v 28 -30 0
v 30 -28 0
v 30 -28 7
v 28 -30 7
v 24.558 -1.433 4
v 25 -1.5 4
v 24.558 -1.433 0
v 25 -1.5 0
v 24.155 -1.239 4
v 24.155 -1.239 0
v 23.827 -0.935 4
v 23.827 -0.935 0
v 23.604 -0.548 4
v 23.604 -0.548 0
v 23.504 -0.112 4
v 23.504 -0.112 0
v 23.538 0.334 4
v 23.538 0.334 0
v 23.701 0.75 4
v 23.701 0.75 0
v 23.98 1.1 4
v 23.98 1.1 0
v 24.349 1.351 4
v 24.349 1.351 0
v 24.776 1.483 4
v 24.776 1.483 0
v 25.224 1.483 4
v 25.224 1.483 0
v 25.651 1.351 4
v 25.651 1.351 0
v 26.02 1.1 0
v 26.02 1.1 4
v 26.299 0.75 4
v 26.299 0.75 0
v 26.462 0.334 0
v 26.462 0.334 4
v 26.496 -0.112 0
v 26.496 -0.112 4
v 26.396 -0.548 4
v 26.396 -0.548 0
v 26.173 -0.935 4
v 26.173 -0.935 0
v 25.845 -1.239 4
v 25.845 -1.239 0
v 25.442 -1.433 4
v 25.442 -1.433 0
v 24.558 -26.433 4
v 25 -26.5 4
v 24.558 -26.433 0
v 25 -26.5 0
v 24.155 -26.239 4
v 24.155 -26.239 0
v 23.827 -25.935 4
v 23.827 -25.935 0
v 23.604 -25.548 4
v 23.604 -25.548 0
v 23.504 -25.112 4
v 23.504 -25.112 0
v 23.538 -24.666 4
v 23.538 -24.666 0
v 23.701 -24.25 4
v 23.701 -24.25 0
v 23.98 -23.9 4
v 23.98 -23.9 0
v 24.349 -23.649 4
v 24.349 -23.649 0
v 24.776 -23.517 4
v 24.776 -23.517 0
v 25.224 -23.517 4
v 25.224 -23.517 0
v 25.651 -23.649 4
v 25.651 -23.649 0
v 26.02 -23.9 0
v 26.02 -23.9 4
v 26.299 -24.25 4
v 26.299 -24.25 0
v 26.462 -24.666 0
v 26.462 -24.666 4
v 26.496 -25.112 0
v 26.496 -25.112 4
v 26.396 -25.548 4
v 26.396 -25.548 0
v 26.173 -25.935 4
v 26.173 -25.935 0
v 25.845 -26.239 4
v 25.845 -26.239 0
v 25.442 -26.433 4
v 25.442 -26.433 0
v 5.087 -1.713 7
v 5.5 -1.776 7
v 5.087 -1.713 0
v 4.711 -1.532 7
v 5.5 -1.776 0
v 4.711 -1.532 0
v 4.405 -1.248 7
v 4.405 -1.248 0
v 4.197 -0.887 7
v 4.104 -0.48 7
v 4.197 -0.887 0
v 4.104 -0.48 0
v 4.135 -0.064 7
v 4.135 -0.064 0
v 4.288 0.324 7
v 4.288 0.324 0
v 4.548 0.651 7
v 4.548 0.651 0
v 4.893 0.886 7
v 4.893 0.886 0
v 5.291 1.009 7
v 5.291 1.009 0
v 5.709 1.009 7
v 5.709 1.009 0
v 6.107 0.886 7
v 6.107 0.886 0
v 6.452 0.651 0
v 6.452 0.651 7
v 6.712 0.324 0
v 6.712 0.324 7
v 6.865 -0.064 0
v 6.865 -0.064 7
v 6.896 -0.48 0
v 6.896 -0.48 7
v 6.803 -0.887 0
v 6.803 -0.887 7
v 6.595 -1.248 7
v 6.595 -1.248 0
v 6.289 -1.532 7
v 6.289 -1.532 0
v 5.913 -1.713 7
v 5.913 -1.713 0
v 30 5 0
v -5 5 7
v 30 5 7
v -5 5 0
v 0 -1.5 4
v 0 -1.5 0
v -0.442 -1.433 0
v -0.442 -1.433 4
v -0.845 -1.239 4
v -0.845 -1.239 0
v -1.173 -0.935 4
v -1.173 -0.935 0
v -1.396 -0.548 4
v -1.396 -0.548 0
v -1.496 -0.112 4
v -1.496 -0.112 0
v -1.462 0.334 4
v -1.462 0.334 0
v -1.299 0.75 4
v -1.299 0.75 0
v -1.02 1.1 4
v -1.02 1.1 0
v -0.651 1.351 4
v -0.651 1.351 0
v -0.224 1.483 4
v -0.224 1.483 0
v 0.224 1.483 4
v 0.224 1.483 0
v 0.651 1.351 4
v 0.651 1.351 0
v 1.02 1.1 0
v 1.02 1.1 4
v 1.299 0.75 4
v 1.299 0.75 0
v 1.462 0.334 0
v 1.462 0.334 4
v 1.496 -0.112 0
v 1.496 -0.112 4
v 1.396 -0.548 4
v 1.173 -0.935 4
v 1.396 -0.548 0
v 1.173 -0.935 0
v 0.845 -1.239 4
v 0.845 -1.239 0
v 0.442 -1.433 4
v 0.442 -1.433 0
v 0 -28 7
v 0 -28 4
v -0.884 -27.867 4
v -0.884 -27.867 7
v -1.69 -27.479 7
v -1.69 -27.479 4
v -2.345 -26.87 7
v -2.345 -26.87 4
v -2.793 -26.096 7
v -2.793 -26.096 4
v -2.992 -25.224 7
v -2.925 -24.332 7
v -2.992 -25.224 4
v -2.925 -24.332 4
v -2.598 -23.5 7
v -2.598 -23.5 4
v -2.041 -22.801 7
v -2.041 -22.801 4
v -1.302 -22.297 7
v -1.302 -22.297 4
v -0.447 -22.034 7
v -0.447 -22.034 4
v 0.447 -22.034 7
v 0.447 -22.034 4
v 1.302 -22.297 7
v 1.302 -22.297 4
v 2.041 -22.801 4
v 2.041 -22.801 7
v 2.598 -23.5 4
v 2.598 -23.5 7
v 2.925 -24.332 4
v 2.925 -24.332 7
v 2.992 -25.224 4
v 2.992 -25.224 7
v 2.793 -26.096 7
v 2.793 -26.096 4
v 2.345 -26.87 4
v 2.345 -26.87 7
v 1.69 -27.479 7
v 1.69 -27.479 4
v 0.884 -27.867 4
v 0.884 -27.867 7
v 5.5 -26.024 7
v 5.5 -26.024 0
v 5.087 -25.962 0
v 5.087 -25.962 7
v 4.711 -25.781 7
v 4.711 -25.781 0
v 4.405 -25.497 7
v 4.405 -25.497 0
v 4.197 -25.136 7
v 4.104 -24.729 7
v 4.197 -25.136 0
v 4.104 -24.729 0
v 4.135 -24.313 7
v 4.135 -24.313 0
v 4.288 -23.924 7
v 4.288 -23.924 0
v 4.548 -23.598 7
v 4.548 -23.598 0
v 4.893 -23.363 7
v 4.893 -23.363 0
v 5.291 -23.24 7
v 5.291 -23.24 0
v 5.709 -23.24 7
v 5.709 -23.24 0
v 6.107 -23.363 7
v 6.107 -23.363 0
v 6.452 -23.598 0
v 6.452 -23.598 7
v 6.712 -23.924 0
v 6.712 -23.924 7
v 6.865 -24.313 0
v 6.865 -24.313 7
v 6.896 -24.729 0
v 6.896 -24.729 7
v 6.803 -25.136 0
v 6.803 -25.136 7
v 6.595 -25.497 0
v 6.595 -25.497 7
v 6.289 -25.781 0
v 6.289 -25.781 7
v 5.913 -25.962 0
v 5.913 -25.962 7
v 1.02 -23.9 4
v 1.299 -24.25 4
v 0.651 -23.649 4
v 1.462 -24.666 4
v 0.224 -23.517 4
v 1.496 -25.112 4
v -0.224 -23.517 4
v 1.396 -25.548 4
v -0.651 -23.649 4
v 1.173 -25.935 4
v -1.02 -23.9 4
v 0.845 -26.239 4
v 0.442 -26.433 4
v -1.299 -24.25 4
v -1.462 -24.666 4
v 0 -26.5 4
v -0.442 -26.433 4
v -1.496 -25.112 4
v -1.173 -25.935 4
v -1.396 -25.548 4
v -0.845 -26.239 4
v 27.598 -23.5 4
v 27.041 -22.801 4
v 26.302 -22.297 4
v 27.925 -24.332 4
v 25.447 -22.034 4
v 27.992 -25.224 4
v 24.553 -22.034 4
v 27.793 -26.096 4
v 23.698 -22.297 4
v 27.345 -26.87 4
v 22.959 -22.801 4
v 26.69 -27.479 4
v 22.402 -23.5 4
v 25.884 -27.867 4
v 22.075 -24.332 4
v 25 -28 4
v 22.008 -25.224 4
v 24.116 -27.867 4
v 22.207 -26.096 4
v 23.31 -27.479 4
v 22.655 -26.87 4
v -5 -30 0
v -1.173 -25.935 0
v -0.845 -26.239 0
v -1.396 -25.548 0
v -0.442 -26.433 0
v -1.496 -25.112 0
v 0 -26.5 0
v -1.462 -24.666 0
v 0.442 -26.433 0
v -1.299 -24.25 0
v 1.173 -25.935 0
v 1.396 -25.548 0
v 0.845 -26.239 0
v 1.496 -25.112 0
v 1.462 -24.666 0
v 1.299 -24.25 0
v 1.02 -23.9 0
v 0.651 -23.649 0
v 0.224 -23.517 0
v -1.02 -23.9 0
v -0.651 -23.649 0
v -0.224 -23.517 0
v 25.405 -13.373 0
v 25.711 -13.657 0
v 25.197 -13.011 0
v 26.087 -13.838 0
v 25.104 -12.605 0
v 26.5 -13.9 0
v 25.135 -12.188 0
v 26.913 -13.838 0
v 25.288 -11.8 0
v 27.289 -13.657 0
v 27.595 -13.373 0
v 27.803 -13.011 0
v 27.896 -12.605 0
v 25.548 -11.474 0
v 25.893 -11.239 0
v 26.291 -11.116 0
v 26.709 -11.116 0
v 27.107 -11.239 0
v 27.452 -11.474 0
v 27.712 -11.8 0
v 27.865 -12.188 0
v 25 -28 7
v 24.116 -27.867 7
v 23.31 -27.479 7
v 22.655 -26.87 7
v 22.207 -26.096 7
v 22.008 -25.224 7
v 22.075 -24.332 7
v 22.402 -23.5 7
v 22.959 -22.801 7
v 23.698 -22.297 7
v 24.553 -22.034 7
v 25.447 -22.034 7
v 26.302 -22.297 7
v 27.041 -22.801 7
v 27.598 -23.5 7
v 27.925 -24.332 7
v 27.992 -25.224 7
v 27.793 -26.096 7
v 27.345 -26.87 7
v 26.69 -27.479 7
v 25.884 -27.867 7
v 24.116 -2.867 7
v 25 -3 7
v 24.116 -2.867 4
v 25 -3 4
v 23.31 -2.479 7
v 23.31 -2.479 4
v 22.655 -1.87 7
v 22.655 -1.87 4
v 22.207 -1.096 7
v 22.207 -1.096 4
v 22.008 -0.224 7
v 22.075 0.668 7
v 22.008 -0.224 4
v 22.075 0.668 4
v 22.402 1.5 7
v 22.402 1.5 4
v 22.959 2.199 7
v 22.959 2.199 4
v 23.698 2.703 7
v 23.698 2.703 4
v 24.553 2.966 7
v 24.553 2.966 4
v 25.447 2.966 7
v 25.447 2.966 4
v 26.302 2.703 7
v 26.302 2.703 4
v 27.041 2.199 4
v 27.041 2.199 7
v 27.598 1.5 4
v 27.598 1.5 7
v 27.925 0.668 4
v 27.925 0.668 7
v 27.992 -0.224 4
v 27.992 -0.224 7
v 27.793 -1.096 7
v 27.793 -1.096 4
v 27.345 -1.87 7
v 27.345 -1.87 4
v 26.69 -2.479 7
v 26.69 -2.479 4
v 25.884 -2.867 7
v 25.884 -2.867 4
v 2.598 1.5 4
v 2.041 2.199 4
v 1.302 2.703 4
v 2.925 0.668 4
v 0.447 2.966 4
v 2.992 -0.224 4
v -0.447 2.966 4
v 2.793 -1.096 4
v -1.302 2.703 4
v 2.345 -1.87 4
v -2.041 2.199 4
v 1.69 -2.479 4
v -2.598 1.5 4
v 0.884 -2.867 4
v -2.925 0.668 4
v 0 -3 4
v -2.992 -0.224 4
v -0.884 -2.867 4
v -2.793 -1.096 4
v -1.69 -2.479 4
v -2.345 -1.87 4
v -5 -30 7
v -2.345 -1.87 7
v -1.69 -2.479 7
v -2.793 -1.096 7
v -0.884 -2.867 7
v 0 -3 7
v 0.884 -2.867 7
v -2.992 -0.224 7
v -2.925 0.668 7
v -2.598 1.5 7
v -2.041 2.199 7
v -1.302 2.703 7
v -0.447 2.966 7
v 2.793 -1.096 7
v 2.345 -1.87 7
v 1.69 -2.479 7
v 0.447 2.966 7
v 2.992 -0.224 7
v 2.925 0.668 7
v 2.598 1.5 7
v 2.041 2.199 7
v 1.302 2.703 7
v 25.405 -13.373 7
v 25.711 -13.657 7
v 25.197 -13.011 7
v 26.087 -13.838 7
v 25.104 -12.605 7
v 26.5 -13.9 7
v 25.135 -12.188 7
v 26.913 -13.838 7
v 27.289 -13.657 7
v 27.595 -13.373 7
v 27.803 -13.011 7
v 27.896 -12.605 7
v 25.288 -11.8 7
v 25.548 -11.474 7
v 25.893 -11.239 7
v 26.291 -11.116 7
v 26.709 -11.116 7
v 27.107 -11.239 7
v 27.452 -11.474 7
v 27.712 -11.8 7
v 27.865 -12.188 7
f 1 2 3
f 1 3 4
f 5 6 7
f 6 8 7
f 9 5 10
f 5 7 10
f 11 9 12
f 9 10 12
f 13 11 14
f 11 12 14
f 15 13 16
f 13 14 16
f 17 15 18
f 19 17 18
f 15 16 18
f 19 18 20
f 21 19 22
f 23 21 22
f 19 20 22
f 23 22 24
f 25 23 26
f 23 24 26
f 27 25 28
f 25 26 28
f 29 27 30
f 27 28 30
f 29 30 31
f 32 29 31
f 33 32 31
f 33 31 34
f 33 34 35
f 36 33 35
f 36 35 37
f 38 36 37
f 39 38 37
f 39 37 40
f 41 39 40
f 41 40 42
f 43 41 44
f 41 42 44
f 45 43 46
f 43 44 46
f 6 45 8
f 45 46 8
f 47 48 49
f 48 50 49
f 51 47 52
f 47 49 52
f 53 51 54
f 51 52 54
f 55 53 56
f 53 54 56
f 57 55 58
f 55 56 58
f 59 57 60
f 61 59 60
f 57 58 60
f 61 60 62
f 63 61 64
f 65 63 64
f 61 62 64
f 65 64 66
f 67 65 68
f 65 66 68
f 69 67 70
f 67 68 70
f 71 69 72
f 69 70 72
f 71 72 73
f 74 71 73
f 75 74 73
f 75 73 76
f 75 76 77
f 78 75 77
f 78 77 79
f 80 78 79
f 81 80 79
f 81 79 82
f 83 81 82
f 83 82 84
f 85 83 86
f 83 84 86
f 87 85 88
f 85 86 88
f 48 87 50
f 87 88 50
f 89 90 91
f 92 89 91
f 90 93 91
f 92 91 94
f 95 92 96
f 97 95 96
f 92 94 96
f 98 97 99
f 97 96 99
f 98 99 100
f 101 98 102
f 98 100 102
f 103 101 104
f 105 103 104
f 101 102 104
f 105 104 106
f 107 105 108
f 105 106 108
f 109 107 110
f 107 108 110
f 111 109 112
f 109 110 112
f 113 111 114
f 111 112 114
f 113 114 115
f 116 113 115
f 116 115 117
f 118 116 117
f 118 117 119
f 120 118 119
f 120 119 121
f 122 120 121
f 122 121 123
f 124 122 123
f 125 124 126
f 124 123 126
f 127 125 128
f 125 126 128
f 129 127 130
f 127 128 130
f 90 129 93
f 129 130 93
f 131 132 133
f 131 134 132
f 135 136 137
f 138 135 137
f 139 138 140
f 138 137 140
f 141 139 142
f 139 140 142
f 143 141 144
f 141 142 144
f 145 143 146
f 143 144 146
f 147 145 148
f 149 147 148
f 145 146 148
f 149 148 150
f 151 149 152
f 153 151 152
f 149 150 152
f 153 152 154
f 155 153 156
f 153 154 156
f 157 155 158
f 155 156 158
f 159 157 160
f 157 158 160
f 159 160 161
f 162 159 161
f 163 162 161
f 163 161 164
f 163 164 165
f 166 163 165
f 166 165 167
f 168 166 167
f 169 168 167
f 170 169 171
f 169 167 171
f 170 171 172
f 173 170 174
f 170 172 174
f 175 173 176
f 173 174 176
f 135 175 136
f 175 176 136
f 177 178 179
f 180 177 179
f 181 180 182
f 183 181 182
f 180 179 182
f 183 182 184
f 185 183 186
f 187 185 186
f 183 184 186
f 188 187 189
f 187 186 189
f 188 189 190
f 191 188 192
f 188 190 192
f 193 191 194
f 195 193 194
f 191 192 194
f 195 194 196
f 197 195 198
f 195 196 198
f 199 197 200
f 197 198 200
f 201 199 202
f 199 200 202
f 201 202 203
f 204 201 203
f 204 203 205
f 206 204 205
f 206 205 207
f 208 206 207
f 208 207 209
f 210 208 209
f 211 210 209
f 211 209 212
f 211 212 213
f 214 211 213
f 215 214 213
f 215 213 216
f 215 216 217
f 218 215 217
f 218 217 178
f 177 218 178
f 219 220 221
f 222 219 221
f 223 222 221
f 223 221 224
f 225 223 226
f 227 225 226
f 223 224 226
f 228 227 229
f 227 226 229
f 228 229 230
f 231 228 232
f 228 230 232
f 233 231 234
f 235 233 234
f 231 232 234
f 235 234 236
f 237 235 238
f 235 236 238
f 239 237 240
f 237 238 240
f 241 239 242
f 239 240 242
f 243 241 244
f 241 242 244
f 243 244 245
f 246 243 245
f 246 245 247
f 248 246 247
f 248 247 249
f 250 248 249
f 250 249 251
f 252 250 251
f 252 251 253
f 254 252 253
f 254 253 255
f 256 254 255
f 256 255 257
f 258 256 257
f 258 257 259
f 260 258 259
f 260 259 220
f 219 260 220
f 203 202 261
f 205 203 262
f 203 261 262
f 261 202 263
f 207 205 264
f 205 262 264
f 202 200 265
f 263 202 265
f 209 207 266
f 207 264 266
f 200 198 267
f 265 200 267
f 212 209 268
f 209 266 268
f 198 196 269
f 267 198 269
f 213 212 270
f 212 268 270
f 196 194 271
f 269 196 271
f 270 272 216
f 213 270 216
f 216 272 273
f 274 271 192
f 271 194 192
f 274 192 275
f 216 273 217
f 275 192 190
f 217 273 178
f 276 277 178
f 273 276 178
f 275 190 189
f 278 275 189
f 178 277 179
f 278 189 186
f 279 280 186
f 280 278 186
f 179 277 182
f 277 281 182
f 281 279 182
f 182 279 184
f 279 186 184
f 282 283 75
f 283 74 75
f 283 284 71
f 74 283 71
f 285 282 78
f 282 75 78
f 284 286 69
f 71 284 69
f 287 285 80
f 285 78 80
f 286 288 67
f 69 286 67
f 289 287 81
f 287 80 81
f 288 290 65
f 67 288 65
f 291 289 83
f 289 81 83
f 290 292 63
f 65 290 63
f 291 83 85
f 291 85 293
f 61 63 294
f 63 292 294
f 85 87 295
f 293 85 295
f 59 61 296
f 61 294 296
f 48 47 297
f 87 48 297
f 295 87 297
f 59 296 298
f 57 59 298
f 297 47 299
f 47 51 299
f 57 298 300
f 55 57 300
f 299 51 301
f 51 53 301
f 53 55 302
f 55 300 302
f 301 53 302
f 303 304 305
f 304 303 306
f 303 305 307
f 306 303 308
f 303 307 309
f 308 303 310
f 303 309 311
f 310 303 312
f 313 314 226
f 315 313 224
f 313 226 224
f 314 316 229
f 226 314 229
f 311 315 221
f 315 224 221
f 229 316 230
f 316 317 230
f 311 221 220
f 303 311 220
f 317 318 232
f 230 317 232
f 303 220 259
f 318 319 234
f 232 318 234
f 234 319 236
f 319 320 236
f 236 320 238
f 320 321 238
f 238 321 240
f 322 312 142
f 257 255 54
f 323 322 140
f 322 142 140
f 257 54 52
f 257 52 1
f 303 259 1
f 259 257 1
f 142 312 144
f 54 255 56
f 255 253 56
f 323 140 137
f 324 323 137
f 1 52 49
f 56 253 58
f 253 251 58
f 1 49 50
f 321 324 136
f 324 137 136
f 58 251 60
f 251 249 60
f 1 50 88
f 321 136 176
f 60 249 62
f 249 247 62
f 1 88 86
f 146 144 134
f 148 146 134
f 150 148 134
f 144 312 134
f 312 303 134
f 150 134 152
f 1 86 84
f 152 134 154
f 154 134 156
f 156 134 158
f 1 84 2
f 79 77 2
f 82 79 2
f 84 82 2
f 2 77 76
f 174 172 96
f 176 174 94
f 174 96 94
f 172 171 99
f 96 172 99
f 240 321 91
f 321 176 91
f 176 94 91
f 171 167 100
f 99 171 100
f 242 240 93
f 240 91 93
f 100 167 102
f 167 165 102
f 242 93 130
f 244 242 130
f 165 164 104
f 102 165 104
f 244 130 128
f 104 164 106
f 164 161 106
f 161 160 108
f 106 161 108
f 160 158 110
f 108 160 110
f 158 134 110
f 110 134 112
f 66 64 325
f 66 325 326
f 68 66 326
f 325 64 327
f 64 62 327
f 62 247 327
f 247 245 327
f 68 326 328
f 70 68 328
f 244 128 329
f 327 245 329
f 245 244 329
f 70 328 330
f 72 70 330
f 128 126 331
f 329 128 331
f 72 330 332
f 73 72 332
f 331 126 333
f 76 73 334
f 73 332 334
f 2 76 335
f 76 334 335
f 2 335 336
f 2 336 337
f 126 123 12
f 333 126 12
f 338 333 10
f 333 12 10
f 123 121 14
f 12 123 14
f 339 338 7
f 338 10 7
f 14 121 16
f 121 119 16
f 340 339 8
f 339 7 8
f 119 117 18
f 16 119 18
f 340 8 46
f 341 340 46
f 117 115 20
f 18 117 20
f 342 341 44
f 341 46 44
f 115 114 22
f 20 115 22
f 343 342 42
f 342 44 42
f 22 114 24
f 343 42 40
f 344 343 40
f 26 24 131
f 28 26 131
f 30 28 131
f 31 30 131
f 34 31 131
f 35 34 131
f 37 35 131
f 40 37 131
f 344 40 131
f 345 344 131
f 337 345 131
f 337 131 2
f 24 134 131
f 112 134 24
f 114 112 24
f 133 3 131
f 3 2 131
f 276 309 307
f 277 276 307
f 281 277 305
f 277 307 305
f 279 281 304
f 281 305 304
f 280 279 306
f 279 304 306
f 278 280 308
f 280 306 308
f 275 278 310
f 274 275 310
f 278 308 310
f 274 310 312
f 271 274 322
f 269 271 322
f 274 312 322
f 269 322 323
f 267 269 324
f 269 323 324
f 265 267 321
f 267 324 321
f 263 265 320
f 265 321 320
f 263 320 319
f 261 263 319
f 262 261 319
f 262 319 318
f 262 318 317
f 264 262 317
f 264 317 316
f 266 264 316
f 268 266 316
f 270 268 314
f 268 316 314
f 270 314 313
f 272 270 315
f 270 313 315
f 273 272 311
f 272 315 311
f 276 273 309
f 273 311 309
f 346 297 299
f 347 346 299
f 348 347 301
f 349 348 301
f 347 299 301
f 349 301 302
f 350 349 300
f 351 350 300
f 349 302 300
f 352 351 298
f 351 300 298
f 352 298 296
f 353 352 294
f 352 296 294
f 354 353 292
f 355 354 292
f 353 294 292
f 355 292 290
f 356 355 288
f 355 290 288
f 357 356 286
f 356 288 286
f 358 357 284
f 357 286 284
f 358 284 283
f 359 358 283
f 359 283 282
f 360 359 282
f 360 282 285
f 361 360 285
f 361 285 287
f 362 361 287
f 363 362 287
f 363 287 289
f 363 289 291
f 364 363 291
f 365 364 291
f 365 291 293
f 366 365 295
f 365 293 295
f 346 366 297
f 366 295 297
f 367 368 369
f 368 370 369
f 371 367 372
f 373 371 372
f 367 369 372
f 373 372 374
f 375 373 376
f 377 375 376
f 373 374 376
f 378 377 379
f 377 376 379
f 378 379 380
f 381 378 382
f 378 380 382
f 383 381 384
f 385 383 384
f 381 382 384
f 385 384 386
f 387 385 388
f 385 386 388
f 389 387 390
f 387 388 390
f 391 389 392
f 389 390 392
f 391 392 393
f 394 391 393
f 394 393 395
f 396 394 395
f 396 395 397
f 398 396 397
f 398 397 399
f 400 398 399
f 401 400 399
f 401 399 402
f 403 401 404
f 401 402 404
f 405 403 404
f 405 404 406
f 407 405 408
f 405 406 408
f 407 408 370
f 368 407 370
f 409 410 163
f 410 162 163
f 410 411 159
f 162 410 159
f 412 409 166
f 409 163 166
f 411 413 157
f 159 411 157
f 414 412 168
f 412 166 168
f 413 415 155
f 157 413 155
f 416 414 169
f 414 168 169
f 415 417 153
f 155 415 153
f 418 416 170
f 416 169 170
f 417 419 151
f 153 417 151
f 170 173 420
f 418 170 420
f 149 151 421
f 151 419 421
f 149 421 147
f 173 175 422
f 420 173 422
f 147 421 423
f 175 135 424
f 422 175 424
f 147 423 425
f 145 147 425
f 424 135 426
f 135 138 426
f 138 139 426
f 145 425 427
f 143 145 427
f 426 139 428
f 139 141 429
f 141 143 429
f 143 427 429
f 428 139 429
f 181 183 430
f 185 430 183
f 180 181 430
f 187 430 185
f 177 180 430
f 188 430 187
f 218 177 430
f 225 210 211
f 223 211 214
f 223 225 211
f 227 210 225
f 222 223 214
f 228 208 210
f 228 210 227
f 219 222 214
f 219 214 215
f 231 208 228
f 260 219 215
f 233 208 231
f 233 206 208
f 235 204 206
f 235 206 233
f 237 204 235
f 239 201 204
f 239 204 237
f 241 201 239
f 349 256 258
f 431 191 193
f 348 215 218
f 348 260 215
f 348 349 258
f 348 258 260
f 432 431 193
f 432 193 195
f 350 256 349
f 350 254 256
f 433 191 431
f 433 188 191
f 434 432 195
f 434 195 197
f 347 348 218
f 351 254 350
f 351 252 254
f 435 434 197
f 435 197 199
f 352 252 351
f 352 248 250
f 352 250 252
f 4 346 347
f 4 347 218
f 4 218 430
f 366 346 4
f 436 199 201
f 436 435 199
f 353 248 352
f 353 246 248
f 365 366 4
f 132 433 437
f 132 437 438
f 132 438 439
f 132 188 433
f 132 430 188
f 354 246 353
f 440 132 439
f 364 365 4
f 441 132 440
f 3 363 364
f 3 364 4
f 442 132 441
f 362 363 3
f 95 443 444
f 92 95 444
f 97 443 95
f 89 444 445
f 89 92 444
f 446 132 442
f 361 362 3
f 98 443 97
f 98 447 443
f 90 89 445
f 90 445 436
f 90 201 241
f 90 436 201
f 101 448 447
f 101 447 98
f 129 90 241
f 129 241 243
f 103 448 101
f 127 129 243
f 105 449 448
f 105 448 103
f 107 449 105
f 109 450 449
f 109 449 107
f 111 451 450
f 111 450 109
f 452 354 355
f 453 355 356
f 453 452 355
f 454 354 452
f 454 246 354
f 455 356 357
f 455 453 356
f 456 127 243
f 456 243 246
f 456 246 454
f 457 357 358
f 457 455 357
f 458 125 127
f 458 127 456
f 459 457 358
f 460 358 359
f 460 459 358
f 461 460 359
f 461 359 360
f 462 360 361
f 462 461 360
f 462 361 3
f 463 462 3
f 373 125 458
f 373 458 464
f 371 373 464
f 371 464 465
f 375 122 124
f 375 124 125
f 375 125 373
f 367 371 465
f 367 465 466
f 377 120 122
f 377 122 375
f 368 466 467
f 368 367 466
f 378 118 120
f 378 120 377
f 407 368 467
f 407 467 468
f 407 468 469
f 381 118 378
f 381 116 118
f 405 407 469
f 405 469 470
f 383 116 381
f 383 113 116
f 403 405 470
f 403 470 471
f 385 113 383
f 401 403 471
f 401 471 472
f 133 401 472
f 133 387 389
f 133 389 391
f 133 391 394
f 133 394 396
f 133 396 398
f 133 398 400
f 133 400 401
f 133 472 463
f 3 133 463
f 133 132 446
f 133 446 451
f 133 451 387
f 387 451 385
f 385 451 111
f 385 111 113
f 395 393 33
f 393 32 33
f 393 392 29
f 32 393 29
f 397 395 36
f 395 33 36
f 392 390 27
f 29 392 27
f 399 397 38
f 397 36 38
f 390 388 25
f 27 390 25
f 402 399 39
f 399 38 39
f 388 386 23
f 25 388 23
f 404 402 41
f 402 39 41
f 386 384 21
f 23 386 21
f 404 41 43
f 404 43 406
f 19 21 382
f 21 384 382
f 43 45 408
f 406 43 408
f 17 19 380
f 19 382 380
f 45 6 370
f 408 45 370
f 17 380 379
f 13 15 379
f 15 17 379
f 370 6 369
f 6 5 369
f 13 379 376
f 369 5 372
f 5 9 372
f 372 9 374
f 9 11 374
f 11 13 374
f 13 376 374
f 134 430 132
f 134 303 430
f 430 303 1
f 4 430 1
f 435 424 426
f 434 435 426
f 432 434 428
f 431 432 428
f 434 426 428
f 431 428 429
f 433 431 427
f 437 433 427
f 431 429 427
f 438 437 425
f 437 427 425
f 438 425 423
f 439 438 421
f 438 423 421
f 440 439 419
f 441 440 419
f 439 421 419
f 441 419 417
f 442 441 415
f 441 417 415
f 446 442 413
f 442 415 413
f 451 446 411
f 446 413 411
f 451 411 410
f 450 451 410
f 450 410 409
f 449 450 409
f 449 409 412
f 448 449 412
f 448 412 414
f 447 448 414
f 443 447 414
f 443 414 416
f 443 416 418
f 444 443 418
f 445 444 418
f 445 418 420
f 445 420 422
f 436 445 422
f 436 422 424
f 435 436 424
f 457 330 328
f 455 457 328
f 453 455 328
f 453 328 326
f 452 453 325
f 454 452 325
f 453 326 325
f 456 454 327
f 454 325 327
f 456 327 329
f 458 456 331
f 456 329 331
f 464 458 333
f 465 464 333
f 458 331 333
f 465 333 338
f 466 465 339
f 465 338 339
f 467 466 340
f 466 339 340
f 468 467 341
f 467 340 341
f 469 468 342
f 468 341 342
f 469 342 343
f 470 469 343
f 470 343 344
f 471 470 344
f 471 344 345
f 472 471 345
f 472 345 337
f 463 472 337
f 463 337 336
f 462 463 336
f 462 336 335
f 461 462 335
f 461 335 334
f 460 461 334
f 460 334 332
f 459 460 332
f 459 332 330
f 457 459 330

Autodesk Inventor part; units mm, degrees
ref_plane "YZ Plane" through (0, 0, 0) normal (1, 0, 0) x (0, 1, 0)
ref_plane "XZ Plane" through (0, 0, 0) normal (0, 1, 0) x (-1, 0, 0)
ref_plane "XY Plane" through (0, 0, 0) normal (0, 0, 1) x (1, 0, 0)
ref_plane "Work Plane1" through (0, 0, 0) normal (0, 0, 1) x (1, 0, 0)
sketch "Sketch1" plane through (0, 0, 0) normal (0, 0, 1) x (1, 0, 0)
  circle A0 centre (25, -10) radius 1.45 projected
  circle A1 centre (-25, -10) radius 1.45 projected
  circle A2 centre (-25, 10) radius 1.45 projected
  circle A3 centre (25, 10) radius 1.45 projected
  circle A4 centre (-10, -25) radius 1.45 projected
  circle A5 centre (-10, 25) radius 1.45 projected
  circle A6 centre (10, 25) radius 1.45 projected
  circle A7 centre (10, -25) radius 1.45 projected
  circle A8 centre (-25, 25) radius 2.325 projected
  circle A9 centre (25, -25) radius 2.325 projected
  circle A10 centre (-25, -25) radius 2.325 projected
  circle A11 centre (25, 25) radius 2.325 projected
  line L0 (28, 30) -> (30, 28) projected
  line L1 (28, 30) -> (-28, 30) projected
  line L2 (-30, 28) -> (-28, 30) projected
  line L3 (-30, 28) -> (-30, -28) projected
  line L4 (-28, -30) -> (-30, -28) projected
  line L5 (-28, -30) -> (28, -30) projected
  line L6 (30, -28) -> (28, -30) projected
  line L7 (30, -28) -> (30, 28) projected
  circle A12 centre (-17.5, -17.5) radius 1.95 projected
  circle A13 centre (17.5, 17.5) radius 1.95 projected
  circle A14 centre (17.5, -17.5) radius 1.95 projected
  circle A15 centre (-17.5, 17.5) radius 1.95 projected
  circle A16 centre (0, 0) radius 7.5 projected
  line L8 (30, -30) -> (-5, -30)
  line L9 (-5, -30) -> (-5, 5)
  line L10 (-5, 5) -> (30, 5)
  line L11 (30, 5) -> (30, -30)
  point P0 (0, 0)
  dimension "d0" = 35
  dimension "d1" = 35
extrude "Extrusion1" add sketch "Sketch1" along normal blind 7 contours A0 | A7 | A9 | L7 L6 L5 L9 A16 L10 | A16 L9 L10 | A14 picked at (1.7753, -1.9143)
sketch "Sketch2" plane through (0, 0, 7) normal (0, 0, 1) x (1, 0, 0)
  line L0 (9.7965, -11.8691) -> (15.0465, -11.8691) projected
  line L1 (-5, 5) -> (-5, -30) projected
  line L2 (-5, -30) -> (28, -30) projected
  line L3 (28, -30) -> (30, -28) projected
  line L4 (30, -28) -> (30, 5) projected
  line L5 (30, 5) -> (-5, 5) projected
  circle A0 centre (12.5, -12.5) radius 17.5
  line L6 (25, -25) -> (0, -25)
  line L7 (0, -25) -> (0, 0)
  line L8 (0, 0) -> (25, 0)
  line L9 (25, 0) -> (25, -25)
  line L10 (25, -25) -> (0, 0) construction
  line L11 (0, -25) -> (25, 0) construction
  dimension "d4" = 25
  dimension "d5" = 25
hole "Hole1" at (25, 0, 7) at (0, -25, 7) at (0, 0, 7) at (25, -25, 7) direction (0, 0, -1) diameter 3 end through all counterbore diameter 6 counterbore depth 3
sketch "Sketch3" plane through (0, 0, 7) normal (0, 0, 1) x (1, 0, 0)
  circle A0 centre (18.5383, 7.9631) radius 1.4 construction
  circle A1 centre (8.5565, 1.2345) radius 2.95 construction
  circle A2 centre (8.5565, -23.0142) radius 2.95 construction
  circle A3 centre (29.5565, -10.8899) radius 2.95 construction
  line L0 (4.5565, -28.3465) -> (33.5565, -28.3465) construction
  line L1 (4.5565, 11.2345) -> (4.5565, -28.3465) construction
  line L2 (33.5565, 11.2345) -> (4.5565, 11.2345) construction
  line L3 (33.5565, -28.3465) -> (33.5565, 11.2345) construction
  line L4 (-5, 5) -> (-5, -30) construction
  line L5 (30, 5) -> (-5, 5) construction
  line L6 (30, -28) -> (30, 5) construction
  circle A4 centre (12.5, -12.5) radius 17.5 construction
  line L7 (26.5, -12.5) -> (5.5, -24.6244) construction
  line L8 (5.5, -24.6244) -> (5.5, -0.3756) construction
  line L9 (5.5, -0.3756) -> (26.5, -12.5) construction
  point P0 (0, 0)
  dimension "d13" = 12.1244
  dimension "d14" = 21
  dimension "d15" = 21
hole "Hole2" at (26.5, -12.5, 7) at (5.5, -24.6244, 7) at (5.5, -0.3756, 7) direction (0, 0, -1) diameter 2.8 end through all
properties part number "30_cellSTORM_UC2_Chip_holder_base"
